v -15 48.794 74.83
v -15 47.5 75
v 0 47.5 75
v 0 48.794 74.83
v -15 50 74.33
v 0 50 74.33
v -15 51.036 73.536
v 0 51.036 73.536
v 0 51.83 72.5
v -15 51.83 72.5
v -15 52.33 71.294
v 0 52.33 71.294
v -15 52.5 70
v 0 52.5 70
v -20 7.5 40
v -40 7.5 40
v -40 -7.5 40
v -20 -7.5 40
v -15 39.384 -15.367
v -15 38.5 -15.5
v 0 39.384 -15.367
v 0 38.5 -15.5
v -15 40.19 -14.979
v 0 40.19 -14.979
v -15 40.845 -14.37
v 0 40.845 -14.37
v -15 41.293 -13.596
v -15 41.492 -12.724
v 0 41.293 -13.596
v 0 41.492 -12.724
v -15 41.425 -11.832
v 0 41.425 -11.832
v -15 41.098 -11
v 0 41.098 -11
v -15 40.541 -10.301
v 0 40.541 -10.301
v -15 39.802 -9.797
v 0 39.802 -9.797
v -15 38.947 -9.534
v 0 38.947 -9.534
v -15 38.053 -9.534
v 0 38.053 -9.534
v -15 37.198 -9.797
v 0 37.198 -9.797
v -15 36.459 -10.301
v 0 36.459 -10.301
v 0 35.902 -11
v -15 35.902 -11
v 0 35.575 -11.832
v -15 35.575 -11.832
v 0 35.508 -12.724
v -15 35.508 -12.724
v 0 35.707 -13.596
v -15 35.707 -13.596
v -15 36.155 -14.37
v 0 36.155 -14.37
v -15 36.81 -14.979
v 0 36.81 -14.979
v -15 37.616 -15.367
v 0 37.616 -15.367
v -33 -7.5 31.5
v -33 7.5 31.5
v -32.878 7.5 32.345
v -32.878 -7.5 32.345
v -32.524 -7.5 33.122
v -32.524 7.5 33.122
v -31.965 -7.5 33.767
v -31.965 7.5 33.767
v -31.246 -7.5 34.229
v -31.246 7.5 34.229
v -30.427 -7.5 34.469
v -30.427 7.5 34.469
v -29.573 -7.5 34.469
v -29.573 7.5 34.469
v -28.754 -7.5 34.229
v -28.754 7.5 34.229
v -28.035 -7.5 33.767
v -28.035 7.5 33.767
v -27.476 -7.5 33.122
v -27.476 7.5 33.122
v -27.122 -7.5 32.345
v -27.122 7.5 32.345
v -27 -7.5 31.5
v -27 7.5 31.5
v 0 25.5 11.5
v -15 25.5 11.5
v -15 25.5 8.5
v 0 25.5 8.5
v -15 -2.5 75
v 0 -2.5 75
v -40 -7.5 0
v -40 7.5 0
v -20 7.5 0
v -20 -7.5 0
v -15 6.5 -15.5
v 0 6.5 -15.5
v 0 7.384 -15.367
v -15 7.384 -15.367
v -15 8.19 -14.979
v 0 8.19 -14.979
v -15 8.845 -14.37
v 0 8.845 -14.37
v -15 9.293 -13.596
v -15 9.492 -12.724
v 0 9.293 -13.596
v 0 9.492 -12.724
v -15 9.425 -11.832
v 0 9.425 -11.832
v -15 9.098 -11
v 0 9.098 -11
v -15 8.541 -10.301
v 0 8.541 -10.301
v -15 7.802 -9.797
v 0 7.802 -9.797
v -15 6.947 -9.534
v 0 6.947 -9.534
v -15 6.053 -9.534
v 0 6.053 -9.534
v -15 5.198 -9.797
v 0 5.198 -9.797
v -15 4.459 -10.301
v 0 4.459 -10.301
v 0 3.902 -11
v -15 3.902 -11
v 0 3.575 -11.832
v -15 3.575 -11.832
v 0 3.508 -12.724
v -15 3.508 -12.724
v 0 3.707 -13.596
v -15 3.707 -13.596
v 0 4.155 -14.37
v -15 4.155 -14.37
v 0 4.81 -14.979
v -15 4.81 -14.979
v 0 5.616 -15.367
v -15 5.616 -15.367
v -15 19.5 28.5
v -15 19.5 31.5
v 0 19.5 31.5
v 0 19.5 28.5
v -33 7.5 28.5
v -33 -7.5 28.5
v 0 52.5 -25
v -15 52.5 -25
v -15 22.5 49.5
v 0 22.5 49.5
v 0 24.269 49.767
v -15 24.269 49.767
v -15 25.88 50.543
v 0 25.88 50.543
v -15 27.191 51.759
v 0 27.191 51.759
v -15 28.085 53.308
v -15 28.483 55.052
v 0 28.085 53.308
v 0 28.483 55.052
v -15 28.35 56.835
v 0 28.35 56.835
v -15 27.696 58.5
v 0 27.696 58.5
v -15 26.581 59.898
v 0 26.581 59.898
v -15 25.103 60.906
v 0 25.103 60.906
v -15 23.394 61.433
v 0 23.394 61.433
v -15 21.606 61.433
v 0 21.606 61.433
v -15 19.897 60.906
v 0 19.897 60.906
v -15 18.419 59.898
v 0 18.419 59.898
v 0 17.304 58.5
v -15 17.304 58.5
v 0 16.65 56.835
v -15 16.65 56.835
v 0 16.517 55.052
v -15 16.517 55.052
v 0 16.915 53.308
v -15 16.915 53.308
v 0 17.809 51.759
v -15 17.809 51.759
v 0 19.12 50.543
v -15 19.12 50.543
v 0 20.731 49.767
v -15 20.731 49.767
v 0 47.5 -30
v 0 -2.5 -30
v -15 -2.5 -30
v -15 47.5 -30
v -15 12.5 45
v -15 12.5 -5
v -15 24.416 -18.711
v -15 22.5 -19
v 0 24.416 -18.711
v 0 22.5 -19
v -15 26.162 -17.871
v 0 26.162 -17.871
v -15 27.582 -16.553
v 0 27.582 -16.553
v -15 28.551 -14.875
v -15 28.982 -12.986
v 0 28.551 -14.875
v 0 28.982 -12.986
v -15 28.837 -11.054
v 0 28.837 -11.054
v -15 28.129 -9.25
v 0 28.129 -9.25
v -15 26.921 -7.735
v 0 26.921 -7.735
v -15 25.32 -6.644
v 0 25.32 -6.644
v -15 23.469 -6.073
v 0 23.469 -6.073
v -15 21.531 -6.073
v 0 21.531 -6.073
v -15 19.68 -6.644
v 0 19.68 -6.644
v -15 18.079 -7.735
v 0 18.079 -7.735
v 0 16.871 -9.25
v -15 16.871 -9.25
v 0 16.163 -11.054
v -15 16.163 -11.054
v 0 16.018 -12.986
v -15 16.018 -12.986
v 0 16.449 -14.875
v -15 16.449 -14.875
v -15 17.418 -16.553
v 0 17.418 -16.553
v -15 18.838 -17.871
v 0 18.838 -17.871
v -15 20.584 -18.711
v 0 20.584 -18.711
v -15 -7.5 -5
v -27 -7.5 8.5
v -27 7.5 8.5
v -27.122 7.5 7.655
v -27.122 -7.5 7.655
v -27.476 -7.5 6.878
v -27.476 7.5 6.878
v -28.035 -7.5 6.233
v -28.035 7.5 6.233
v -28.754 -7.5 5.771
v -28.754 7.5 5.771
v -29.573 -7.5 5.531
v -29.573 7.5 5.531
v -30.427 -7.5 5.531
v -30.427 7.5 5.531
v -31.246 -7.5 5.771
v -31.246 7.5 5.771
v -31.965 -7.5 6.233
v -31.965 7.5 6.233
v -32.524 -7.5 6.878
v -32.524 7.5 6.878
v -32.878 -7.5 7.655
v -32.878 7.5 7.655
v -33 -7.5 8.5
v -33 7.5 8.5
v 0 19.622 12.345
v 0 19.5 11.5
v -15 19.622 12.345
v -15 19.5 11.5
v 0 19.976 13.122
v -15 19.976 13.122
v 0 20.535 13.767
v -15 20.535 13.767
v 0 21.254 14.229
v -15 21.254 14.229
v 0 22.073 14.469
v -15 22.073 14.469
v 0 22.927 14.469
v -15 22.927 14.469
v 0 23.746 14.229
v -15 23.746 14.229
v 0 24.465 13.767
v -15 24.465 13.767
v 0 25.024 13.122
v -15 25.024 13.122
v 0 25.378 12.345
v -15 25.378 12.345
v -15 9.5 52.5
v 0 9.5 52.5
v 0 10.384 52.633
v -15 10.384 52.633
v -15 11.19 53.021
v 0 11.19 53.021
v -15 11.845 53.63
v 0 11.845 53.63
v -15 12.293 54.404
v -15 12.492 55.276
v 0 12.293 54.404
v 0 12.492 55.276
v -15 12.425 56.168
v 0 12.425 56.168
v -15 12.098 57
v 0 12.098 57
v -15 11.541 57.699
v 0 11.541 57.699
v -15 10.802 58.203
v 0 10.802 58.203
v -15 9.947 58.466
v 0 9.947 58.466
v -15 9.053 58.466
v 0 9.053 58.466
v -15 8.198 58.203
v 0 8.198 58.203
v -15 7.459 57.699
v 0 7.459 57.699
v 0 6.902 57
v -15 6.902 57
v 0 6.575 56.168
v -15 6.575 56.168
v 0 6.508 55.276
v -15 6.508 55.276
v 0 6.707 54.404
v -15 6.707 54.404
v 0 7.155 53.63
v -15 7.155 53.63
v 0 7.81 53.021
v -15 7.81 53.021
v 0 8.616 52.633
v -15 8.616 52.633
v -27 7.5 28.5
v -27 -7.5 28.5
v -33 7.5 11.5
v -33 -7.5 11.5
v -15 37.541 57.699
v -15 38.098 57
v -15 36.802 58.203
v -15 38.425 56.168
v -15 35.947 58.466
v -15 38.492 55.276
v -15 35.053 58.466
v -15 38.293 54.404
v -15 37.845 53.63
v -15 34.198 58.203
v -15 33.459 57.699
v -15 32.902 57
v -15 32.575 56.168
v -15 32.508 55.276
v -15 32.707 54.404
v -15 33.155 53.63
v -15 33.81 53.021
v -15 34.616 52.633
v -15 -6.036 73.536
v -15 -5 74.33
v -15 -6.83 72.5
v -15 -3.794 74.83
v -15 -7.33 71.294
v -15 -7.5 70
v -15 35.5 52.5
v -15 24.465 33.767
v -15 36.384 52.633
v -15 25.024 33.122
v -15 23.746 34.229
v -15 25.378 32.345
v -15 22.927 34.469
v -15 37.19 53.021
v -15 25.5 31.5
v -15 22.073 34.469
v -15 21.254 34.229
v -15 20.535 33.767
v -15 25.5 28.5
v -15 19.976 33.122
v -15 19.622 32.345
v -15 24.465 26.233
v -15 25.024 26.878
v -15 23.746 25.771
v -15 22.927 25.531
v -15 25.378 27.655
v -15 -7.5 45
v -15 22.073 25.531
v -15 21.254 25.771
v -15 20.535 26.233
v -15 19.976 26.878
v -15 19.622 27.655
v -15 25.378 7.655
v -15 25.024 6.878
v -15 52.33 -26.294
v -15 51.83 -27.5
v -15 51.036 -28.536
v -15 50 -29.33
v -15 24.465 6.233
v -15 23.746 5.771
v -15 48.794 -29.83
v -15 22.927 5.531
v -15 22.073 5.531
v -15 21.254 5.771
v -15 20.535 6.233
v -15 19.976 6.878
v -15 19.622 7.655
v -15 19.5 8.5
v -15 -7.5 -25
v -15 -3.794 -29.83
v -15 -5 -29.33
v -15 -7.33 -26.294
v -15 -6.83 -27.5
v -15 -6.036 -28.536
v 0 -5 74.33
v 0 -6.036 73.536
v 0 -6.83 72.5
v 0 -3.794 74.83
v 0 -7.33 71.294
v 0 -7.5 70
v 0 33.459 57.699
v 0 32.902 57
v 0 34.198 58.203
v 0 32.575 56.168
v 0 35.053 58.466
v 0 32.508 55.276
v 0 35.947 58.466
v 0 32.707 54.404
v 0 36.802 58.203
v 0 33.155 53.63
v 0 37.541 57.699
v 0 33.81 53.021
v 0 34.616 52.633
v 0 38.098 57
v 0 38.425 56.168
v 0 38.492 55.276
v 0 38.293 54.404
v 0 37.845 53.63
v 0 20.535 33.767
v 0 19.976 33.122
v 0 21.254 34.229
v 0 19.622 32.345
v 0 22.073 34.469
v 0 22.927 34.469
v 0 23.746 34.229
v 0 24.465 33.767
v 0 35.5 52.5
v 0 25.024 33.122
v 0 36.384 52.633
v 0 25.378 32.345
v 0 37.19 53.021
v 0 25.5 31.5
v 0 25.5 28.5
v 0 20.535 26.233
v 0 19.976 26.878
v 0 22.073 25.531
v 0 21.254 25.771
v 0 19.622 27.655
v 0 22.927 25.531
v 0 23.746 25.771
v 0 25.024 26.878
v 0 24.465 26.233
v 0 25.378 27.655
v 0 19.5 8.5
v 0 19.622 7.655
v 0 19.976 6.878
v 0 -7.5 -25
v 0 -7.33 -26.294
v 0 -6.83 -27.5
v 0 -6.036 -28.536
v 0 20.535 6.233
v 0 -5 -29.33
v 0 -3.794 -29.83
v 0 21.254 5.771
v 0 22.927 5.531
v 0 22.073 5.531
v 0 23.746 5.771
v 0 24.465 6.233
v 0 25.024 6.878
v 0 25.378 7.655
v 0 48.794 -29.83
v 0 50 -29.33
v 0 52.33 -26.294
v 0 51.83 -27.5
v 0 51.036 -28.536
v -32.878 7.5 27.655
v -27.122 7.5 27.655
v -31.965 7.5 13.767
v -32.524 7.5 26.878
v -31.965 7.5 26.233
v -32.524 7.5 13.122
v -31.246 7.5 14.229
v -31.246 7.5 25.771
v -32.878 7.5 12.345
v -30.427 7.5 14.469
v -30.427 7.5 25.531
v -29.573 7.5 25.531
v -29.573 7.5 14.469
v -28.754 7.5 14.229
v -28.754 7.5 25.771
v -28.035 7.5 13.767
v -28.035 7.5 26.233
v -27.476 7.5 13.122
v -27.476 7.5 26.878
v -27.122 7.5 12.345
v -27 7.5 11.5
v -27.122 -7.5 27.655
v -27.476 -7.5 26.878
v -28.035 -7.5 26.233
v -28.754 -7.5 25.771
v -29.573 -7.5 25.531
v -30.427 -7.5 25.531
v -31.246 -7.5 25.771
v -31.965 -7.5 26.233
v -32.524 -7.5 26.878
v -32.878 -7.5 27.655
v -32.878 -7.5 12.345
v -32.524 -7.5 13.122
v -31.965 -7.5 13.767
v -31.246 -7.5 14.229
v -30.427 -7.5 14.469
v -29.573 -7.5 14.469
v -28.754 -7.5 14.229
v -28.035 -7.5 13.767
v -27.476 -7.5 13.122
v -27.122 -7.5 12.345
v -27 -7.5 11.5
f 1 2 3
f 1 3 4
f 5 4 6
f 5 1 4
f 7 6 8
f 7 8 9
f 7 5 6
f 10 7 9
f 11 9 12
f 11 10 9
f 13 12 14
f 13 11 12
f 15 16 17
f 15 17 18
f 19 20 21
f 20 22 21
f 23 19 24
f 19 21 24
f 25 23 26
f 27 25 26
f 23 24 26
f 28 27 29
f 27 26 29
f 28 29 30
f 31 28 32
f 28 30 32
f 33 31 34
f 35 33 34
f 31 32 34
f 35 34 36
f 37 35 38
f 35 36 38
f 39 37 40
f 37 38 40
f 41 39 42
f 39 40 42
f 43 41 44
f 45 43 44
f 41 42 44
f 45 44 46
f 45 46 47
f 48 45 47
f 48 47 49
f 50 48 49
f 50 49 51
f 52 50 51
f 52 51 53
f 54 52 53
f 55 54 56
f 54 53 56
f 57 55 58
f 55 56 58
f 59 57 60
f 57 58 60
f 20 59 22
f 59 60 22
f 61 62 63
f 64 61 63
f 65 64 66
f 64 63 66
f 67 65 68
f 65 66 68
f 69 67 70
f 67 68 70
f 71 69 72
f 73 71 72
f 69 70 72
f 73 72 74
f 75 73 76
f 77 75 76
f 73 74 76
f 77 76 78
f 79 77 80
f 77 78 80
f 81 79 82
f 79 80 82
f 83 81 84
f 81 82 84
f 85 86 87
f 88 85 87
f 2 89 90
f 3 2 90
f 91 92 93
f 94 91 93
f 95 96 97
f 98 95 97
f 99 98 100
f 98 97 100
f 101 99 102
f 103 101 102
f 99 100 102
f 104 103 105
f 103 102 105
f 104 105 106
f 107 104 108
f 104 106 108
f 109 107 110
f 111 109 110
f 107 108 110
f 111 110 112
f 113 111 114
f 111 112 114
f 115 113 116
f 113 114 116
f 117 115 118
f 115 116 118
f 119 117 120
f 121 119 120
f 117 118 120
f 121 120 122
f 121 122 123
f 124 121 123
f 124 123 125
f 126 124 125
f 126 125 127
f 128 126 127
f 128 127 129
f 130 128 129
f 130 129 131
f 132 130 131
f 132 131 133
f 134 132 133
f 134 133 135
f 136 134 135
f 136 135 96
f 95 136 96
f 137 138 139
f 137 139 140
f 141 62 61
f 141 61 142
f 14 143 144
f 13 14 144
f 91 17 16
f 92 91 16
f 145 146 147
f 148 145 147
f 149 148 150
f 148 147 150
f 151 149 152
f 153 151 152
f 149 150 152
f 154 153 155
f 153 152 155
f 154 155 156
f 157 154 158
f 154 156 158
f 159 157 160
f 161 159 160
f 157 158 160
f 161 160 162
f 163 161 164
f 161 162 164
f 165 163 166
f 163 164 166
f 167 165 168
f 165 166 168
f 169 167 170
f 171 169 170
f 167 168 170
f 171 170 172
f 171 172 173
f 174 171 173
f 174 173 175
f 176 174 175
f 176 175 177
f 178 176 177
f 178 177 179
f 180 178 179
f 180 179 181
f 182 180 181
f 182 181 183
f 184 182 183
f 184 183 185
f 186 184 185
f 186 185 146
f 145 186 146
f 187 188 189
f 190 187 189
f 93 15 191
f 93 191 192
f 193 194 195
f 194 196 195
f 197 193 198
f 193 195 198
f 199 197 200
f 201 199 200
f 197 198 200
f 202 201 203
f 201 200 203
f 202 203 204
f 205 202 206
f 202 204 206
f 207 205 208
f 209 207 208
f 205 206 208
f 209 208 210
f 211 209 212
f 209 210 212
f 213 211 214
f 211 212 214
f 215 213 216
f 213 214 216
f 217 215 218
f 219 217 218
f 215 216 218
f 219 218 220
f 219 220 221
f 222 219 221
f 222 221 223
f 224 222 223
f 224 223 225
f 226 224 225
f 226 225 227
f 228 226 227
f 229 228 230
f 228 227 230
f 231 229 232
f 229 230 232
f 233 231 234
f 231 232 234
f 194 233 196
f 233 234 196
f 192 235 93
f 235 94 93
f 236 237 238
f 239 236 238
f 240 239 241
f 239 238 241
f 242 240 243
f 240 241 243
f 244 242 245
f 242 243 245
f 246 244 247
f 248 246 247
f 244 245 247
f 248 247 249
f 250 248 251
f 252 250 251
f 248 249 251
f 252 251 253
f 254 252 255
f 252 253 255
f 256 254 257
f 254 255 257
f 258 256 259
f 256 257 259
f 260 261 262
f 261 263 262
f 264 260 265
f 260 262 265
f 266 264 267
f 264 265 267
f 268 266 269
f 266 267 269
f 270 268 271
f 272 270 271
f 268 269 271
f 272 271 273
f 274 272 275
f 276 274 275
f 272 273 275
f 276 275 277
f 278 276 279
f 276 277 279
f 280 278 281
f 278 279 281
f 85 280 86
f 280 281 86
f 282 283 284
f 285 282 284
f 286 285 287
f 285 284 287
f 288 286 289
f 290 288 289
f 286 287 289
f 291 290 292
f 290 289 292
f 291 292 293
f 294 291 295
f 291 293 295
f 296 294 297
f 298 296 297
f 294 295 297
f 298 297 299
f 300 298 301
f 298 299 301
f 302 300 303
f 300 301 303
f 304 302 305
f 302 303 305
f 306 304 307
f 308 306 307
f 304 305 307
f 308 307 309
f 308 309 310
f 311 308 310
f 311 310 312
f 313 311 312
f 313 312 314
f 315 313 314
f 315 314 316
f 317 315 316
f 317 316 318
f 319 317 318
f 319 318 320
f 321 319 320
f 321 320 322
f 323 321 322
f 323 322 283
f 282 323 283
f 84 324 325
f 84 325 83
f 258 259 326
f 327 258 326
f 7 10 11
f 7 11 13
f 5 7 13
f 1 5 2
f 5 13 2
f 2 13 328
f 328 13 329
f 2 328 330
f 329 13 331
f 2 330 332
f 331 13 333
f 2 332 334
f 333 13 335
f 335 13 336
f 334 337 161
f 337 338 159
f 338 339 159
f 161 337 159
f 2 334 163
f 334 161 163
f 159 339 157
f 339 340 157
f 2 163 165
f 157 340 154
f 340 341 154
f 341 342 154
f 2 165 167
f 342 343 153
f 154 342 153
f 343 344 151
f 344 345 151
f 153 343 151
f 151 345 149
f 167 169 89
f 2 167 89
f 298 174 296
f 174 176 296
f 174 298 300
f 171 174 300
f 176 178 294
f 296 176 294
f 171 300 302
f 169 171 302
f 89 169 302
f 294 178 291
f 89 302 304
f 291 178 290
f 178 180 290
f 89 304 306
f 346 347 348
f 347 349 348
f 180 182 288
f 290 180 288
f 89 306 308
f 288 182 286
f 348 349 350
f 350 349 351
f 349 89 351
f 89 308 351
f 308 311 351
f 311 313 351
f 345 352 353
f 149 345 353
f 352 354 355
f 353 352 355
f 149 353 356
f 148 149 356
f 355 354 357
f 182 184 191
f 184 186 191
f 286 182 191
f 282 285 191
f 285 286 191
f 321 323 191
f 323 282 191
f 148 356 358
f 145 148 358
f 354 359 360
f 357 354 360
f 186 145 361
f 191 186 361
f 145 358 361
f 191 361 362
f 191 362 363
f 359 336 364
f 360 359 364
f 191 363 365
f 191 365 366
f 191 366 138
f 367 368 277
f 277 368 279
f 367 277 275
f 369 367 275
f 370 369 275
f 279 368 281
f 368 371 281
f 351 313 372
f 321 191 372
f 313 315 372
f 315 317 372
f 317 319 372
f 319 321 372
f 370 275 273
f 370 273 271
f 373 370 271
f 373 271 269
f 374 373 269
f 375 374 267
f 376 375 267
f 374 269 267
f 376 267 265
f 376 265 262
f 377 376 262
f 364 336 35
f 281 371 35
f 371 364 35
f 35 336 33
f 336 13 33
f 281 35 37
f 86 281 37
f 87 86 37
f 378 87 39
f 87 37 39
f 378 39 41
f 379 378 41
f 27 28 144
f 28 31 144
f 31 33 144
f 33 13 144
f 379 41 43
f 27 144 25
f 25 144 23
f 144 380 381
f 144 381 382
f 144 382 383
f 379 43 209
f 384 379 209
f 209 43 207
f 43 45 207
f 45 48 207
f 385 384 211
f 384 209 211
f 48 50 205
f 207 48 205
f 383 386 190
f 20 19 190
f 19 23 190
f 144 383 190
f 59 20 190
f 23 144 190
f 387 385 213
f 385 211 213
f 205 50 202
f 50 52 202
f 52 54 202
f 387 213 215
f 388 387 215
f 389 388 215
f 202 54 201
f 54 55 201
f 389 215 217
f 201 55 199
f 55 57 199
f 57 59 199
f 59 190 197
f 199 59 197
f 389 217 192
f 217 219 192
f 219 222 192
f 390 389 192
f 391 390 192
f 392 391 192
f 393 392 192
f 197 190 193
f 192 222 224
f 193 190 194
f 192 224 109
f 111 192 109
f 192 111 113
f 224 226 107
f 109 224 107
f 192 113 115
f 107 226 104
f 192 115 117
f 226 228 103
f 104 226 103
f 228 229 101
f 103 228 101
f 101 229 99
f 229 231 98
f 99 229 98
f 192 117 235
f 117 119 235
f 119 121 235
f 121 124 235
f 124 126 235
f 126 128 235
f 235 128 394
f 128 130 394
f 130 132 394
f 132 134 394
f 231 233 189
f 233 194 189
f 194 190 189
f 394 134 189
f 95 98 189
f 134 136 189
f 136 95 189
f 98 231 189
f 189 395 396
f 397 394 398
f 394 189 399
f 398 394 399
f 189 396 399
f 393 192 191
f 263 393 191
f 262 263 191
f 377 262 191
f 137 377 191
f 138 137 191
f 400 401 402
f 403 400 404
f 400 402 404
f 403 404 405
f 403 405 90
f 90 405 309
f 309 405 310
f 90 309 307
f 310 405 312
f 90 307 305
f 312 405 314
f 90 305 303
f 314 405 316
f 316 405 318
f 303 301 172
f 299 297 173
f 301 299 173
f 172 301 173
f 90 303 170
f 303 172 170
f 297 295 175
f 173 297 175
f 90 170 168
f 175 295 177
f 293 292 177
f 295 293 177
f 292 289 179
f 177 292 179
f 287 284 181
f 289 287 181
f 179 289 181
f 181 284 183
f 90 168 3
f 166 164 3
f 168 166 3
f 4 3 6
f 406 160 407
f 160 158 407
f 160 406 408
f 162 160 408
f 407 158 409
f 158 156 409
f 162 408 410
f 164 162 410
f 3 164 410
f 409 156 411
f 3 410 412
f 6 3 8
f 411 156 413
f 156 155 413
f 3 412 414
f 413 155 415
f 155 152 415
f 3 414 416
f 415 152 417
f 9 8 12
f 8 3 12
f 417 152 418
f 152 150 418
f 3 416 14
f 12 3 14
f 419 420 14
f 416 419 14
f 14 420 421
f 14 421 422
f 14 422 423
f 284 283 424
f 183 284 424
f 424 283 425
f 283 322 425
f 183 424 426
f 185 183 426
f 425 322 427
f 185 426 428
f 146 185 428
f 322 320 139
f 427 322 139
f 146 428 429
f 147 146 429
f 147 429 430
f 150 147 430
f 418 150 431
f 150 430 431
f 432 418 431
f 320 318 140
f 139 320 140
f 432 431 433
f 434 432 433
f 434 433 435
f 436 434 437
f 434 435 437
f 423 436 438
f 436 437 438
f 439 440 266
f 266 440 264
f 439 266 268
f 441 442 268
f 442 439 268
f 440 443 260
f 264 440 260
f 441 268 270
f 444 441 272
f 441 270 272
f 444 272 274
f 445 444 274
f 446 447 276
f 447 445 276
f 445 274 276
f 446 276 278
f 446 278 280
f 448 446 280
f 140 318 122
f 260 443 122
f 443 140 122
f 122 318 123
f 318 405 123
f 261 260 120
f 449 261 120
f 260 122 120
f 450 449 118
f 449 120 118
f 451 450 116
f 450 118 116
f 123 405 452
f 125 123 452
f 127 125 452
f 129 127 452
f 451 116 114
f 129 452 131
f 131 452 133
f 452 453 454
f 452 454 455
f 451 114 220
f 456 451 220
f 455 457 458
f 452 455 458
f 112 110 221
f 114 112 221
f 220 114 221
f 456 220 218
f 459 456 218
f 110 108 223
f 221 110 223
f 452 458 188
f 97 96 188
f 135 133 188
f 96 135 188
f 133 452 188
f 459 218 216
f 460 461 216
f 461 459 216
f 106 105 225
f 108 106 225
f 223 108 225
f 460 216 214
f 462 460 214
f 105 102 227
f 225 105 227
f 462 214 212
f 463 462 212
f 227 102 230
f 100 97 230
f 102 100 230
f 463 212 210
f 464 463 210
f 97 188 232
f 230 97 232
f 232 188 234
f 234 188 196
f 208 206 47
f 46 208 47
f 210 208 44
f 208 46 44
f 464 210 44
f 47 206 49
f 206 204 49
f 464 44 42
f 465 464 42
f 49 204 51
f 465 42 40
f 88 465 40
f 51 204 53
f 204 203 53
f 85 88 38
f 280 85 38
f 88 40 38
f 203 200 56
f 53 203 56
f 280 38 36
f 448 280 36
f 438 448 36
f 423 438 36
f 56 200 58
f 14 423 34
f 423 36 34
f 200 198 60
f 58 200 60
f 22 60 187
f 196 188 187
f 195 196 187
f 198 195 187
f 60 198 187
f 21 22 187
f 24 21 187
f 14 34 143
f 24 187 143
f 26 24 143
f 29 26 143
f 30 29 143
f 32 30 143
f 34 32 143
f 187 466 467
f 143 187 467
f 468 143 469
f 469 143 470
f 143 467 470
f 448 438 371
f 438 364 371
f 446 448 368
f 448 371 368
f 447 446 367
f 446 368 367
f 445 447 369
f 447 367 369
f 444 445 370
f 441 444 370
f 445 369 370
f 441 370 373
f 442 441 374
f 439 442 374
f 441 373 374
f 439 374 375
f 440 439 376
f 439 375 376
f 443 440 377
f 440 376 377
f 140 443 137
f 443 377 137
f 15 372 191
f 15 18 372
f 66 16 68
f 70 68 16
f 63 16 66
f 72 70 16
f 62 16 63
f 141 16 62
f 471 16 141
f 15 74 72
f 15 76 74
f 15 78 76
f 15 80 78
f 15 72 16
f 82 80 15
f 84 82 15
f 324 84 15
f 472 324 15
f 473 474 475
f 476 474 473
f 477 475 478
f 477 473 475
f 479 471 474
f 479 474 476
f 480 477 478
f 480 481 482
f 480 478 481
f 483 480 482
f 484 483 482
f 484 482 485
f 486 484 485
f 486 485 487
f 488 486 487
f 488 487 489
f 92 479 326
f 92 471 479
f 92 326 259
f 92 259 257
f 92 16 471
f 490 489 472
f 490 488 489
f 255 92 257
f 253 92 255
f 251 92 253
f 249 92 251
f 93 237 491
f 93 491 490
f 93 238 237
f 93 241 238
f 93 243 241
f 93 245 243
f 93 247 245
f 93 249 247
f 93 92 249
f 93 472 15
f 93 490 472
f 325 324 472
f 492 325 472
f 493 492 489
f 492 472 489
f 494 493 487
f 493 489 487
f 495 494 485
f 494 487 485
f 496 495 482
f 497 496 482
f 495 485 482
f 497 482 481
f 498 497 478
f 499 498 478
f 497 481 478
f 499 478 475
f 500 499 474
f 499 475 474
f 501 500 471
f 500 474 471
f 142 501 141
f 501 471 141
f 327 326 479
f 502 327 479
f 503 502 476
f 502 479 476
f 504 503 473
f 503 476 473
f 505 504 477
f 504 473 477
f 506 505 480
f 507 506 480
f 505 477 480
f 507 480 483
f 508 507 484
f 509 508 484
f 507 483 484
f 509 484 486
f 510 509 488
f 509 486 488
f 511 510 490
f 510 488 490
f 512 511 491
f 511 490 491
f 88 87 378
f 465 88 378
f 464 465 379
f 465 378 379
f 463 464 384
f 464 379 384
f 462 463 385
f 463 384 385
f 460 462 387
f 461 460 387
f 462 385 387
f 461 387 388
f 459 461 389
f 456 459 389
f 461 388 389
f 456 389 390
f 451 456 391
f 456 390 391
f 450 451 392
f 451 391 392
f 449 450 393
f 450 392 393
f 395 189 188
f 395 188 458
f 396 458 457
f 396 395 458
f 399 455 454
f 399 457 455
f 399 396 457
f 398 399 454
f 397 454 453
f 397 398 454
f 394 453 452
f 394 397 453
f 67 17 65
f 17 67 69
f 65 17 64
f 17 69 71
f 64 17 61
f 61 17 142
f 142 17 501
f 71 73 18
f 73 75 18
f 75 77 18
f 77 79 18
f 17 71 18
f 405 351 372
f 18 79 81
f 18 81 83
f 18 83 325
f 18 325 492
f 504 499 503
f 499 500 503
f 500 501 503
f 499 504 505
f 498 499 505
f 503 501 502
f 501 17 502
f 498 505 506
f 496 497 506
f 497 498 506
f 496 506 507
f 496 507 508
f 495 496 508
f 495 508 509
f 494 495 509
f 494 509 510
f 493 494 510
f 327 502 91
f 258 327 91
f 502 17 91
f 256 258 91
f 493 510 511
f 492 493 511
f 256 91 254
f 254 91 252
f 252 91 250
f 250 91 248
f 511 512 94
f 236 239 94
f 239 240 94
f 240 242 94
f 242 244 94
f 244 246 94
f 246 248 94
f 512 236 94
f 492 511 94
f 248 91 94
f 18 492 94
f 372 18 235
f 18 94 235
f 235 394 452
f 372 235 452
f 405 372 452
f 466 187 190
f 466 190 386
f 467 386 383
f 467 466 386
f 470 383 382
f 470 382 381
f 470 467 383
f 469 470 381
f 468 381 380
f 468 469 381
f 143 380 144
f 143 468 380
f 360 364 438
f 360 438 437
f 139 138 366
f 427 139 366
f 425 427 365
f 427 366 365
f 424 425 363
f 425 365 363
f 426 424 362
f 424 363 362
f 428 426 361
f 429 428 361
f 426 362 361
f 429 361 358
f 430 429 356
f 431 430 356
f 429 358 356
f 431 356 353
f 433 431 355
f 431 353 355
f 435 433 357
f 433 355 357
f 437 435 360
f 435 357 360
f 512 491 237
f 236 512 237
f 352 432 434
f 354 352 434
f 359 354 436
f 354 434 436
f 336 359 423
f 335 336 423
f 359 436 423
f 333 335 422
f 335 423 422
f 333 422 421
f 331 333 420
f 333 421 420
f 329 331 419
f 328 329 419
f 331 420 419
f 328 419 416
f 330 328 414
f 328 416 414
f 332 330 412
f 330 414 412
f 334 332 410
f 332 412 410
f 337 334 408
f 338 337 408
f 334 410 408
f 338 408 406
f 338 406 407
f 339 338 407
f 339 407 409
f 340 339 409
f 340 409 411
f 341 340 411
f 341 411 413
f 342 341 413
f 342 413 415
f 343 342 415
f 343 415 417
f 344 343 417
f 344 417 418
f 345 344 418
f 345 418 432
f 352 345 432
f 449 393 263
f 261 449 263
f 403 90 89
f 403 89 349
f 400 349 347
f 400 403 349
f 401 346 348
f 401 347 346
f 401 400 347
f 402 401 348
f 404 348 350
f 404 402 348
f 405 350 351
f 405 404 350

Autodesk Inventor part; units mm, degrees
ref_plane "YZ Plane" through (0, 0, 0) normal (1, 0, 0) x (0, 1, 0)
ref_plane "XZ Plane" through (0, 0, 0) normal (0, 1, 0) x (-1, 0, 0)
ref_plane "XY Plane" through (0, 0, 0) normal (0, 0, 1) x (1, 0, 0)
sketch "Sketch1" plane through (0, 0, 0) normal (0, 0, 1) x (1, 0, 0)
  line L0 (-40, 7.5) -> (0, 7.5)
  line L1 (0, 7.5) -> (0, -7.5)
  line L2 (0, -7.5) -> (-40, -7.5)
  line L3 (-40, -7.5) -> (-40, 7.5)
  line L4 (-15, 52.5) -> (0, 52.5)
  line L5 (0, 52.5) -> (0, 7.5)
  line L6 (0, 7.5) -> (-15, 7.5)
  line L7 (-15, 7.5) -> (-15, 52.5)
  point P0 (0, 0)
  point P1 (-15, 7.5)
  dimension "d0" = 15
  dimension "d1" = 40
  dimension "d2" = 60
extrude "Extrusion1" add sketch "Sketch1" along normal blind 40
sketch "Sketch2" plane through (-15, 7.5, 0) normal (-1, 0, 0) x (0, 0, 1)
  line L0 (8.5, 15) -> (11.5, 15) construction
  line L1 (8.5, 12) -> (11.5, 12)
  line L2 (11.5, 18) -> (8.5, 18)
  arc A0 (8.5, 18) -> (8.5, 12) centre (8.5, 15) ccw
  arc A1 (11.5, 12) -> (11.5, 18) centre (11.5, 15) ccw
  line L3 (0, 45) -> (0, 0) projected
  line L4 (0, 45) -> (40, 45) projected
  line L5 (20, 21.547) -> (20, 15) construction
  line L6 (31.5, 15) -> (28.5, 15) construction
  line L7 (31.5, 12) -> (28.5, 12)
  line L8 (28.5, 18) -> (31.5, 18)
  arc A2 (31.5, 12) -> (31.5, 18) centre (31.5, 15) ccw
  arc A3 (28.5, 18) -> (28.5, 12) centre (28.5, 15) ccw
  point P0 (0, -7.5)
  point P1 (10, 15)
  point P2 (20, 18.2735)
  point P3 (20, 45)
  point P4 (30, 15)
  dimension "d5" = 6
  dimension "d6" = 3
  dimension "d7" = 10
  dimension "d8" = 30
extrude "Extrusion2" cut sketch "Sketch2" against normal through all
sketch "Sketch3" plane through (-40, 7.5, 0) normal (0, 1, 0) x (1, 0, 0)
  line L0 (10, -8.5) -> (10, -11.5) construction
  line L1 (7, -8.5) -> (7, -11.5)
  line L2 (13, -11.5) -> (13, -8.5)
  arc A0 (13, -8.5) -> (7, -8.5) centre (10, -8.5) ccw
  arc A1 (7, -11.5) -> (13, -11.5) centre (10, -11.5) ccw
  line L3 (25, 0) -> (0, 0) projected
  line L4 (0, 0) -> (0, -40) projected
  line L5 (15.2557, -20) -> (9.287, -20) construction
  line L6 (10, -31.5) -> (10, -28.5) construction
  line L7 (7, -31.5) -> (7, -28.5)
  line L8 (13, -28.5) -> (13, -31.5)
  arc A2 (7, -31.5) -> (13, -31.5) centre (10, -31.5) ccw
  arc A3 (13, -28.5) -> (7, -28.5) centre (10, -28.5) ccw
  point P0 (40, 0)
  point P1 (10, -10)
  point P2 (12.2713, -20)
  point P3 (0, -20)
  point P4 (10, -30)
  dimension "d11" = 3
  dimension "d12" = 6
  dimension "d13" = 10
  dimension "d14" = 10
extrude "Extrusion3" cut sketch "Sketch3" against normal through all
sketch "Sketch5" plane through (0, 0, 0) normal (0, 0, -1) x (-1, 0, 0)
  line L0 (0, -7.5) -> (15, -7.5)
  line L1 (15, -7.5) -> (15, 52.5)
  line L2 (15, 52.5) -> (0, 52.5)
  line L3 (0, 52.5) -> (0, -7.5)
  line L4 (0, -7.5) -> (0, 52.5) projected
  line L5 (40, -7.5) -> (0, -7.5) projected
  line L6 (0, 52.5) -> (15, 52.5) projected
  line L7 (15, 52.5) -> (15, 7.5) projected
  point P0 (0, 0)
  point P1 (10, 15)
extrude "Extrusion4" add sketch "Sketch5" along normal blind 30
sketch "Sketch6" plane through (0, -7.5, 40) normal (1, 0, 0) x (0, 0, -1)
  circle A0 centre (52.5, 14) radius 3
  circle A1 centre (52.5, 46) radius 3
  line L0 (70, 0) -> (0, 0) projected
  line L1 (70, 60) -> (70, 0) projected
  circle A2 centre (52.5, 30) radius 6.5
  point P0 (40, 7.5)
  dimension "d23" = 32
  dimension "d24" = 14
  dimension "d25" = 17.5
  dimension "d26" = 6
  dimension "d31" = 13
  dimension "d32" = 16
extrude "Extrusion5" cut sketch "Sketch6" against normal through all
sketch "Sketch7" plane through (0, 0, 40) normal (0, 0, 1) x (1, 0, 0)
  line L0 (0, 52.5) -> (-15, 52.5)
  line L1 (-15, 52.5) -> (-15, -7.5)
  line L2 (-15, -7.5) -> (0, -7.5)
  line L3 (0, -7.5) -> (0, 52.5)
  line L4 (0, -7.5) -> (0, 52.5) projected
  line L5 (0, 52.5) -> (-15, 52.5) projected
  line L6 (-15, 52.5) -> (-15, 7.5) projected
  line L7 (-40, -7.5) -> (0, -7.5) projected
  point P0 (0, 0)
  point P1 (-10, 15)
extrude "Extrusion6" add sketch "Sketch7" along normal blind 35
sketch "Sketch8" plane through (0, -7.5, -30) normal (1, 0, 0) x (0, 0, -1)
  circle A0 centre (-85.5, 30) radius 6
  circle A1 centre (-85.5, 17) radius 3
  circle A2 centre (-85.5, 43) radius 3
  line L0 (-105, 60) -> (0, 60) projected
  line L1 (-105, 0) -> (-105, 60) projected
  point P0 (-30, 7.5)
  dimension "d33" = 12
  dimension "d34" = 6
  dimension "d35" = 17
  dimension "d36" = 19.5
  dimension "d37" = 26
  dimension "d38" = 13
extrude "Extrusion7" cut sketch "Sketch8" against normal through all
chamfer "Chamfer2" distance 5 angle 45 3 edges at (-15, 0, 40) (-15, 7.5, 20) (-15, 0, 0)
fillet "Fillet2" radius 5 4 edges at (-7.5, 52.5, 75) (-7.5, -7.5, 75) (-7.5, 52.5, -30) (-7.5, -7.5, -30)
equation "\"d32\" = 0.5 * d23"
equation "\"d38\" = 0.5 * d37"
properties part number "0008-10-033" material "ABS Plastic"
